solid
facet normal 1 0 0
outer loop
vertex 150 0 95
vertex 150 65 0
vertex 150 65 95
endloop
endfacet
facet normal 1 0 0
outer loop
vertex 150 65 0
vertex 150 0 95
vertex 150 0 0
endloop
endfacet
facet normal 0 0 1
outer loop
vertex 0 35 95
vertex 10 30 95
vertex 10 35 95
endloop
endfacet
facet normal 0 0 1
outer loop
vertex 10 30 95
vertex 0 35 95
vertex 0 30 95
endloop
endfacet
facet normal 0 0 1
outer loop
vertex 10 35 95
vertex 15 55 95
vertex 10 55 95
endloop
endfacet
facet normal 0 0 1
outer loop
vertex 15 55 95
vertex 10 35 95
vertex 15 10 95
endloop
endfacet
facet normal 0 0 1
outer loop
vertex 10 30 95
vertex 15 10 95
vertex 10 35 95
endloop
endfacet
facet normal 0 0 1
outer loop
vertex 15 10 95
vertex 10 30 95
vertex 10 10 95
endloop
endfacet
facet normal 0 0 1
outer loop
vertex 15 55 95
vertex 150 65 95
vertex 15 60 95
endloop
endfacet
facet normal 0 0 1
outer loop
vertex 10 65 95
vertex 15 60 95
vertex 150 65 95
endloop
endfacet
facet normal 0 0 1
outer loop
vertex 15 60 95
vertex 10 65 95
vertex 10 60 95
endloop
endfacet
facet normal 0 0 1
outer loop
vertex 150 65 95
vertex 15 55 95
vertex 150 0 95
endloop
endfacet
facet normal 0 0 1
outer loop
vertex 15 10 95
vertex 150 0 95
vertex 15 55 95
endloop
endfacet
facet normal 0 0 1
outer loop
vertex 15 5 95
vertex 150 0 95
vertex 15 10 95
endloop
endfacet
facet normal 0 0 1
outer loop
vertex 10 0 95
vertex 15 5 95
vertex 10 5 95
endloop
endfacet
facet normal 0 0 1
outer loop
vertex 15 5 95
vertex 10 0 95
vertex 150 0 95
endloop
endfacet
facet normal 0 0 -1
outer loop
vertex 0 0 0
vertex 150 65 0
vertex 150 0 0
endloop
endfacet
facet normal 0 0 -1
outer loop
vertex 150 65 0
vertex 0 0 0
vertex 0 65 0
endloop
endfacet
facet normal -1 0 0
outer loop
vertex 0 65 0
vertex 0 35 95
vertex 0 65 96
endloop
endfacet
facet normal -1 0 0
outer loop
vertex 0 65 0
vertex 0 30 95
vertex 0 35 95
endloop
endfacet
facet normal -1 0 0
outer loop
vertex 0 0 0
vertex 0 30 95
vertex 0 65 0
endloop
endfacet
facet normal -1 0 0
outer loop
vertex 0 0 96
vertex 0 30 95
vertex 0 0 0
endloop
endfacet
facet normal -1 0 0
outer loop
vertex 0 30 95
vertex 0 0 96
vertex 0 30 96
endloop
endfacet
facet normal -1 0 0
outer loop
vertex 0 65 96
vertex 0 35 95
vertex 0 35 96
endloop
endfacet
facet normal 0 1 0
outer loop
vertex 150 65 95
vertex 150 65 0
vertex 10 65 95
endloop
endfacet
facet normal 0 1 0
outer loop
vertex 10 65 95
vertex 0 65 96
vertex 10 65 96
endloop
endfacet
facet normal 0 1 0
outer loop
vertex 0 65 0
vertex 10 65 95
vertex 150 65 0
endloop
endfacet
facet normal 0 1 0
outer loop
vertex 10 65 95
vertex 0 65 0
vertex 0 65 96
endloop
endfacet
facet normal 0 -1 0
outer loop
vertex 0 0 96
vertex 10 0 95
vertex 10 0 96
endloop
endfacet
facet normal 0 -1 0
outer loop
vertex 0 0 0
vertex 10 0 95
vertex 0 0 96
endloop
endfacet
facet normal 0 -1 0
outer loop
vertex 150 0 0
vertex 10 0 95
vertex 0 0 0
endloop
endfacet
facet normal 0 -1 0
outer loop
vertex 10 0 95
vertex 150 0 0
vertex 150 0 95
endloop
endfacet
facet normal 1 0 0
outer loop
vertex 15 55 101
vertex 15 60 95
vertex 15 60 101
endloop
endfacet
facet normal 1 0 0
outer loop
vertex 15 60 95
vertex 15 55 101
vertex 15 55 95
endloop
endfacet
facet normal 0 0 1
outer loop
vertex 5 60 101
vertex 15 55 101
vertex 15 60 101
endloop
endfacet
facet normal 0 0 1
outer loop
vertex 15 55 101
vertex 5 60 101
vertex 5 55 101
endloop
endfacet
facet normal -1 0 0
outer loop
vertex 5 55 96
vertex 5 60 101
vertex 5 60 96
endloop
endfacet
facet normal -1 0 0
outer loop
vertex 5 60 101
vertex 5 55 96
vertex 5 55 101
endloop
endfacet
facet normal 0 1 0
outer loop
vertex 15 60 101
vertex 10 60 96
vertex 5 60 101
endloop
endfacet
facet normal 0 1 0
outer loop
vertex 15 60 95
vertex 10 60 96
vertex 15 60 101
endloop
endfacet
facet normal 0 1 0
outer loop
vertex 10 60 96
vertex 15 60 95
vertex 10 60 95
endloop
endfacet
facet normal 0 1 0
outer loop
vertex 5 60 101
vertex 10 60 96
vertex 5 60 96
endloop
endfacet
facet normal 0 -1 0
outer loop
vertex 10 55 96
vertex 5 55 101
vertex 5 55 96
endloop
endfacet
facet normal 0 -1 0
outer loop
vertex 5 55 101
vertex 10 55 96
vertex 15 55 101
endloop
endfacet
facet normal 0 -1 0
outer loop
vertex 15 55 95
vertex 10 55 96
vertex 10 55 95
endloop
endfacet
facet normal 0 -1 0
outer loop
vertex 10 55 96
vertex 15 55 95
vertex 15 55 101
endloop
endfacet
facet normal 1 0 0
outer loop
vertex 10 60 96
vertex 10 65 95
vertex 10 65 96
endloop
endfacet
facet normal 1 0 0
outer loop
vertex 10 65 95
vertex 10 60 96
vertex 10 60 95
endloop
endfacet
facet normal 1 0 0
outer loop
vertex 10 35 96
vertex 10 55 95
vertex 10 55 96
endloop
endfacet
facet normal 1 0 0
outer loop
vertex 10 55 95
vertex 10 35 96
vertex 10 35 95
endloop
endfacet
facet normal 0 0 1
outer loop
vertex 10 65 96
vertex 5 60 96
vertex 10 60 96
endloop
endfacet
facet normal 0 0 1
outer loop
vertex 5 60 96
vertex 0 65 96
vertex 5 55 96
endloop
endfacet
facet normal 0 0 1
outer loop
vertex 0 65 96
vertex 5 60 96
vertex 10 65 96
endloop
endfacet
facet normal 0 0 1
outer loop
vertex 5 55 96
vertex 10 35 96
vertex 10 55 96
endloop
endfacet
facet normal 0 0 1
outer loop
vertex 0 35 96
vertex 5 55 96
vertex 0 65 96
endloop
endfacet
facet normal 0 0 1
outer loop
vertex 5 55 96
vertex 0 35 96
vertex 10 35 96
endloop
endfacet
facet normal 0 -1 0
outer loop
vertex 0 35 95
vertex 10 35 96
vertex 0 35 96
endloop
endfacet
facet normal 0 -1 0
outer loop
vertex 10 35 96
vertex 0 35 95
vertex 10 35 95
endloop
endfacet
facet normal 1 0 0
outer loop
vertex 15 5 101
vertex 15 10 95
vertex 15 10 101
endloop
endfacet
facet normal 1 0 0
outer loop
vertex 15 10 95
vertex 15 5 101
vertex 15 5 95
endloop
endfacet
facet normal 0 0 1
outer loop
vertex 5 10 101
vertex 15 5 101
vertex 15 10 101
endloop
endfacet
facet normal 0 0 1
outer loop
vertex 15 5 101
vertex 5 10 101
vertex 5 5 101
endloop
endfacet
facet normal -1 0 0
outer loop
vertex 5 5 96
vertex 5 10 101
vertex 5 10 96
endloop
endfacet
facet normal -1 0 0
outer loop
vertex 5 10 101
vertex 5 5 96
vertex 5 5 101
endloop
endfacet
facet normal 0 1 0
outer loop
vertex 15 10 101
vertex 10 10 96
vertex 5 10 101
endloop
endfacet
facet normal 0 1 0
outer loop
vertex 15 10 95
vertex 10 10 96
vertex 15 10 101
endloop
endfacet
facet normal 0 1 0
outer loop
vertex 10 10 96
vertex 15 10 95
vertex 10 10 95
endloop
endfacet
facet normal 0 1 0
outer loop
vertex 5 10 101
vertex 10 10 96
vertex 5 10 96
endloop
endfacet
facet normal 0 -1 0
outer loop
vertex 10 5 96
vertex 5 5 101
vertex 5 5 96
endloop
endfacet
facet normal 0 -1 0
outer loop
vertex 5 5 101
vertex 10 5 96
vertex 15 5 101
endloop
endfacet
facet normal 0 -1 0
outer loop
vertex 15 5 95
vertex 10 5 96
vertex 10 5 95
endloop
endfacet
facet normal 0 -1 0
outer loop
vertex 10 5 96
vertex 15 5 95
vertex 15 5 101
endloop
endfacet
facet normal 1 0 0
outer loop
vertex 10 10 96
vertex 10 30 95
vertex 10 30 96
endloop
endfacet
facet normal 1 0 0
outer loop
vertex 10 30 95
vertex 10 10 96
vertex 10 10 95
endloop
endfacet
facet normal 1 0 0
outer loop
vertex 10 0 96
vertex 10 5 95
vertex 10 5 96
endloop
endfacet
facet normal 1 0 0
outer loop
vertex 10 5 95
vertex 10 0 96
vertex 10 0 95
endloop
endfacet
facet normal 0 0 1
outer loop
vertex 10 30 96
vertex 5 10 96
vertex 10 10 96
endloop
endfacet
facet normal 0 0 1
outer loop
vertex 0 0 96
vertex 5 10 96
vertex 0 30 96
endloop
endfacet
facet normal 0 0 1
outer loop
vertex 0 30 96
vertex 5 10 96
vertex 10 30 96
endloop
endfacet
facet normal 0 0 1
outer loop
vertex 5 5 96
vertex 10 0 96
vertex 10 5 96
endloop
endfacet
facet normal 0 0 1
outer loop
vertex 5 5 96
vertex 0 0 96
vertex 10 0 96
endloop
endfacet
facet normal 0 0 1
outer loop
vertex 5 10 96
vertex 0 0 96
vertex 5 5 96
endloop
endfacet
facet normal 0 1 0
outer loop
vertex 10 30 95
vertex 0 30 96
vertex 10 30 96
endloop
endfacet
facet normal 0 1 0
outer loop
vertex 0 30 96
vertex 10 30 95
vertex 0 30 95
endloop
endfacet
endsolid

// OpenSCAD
module bleiakku(){ 
        color([0,0,0]) cube([150,65,95]);
        
        translate([5,55,95]) color([0.5,0.5,0.5]) cube([10,5,6]);    
        translate([0,35,95]) color([1,0,0]) cube([10,30,1]); 
        
        translate([5,5,95]) color([0.5,0.5,0.5]) cube([10,5,6]);    
        translate([0,0,95]) color([0,0,1]) cube([10,30,1]); 
}

bleiakku();
